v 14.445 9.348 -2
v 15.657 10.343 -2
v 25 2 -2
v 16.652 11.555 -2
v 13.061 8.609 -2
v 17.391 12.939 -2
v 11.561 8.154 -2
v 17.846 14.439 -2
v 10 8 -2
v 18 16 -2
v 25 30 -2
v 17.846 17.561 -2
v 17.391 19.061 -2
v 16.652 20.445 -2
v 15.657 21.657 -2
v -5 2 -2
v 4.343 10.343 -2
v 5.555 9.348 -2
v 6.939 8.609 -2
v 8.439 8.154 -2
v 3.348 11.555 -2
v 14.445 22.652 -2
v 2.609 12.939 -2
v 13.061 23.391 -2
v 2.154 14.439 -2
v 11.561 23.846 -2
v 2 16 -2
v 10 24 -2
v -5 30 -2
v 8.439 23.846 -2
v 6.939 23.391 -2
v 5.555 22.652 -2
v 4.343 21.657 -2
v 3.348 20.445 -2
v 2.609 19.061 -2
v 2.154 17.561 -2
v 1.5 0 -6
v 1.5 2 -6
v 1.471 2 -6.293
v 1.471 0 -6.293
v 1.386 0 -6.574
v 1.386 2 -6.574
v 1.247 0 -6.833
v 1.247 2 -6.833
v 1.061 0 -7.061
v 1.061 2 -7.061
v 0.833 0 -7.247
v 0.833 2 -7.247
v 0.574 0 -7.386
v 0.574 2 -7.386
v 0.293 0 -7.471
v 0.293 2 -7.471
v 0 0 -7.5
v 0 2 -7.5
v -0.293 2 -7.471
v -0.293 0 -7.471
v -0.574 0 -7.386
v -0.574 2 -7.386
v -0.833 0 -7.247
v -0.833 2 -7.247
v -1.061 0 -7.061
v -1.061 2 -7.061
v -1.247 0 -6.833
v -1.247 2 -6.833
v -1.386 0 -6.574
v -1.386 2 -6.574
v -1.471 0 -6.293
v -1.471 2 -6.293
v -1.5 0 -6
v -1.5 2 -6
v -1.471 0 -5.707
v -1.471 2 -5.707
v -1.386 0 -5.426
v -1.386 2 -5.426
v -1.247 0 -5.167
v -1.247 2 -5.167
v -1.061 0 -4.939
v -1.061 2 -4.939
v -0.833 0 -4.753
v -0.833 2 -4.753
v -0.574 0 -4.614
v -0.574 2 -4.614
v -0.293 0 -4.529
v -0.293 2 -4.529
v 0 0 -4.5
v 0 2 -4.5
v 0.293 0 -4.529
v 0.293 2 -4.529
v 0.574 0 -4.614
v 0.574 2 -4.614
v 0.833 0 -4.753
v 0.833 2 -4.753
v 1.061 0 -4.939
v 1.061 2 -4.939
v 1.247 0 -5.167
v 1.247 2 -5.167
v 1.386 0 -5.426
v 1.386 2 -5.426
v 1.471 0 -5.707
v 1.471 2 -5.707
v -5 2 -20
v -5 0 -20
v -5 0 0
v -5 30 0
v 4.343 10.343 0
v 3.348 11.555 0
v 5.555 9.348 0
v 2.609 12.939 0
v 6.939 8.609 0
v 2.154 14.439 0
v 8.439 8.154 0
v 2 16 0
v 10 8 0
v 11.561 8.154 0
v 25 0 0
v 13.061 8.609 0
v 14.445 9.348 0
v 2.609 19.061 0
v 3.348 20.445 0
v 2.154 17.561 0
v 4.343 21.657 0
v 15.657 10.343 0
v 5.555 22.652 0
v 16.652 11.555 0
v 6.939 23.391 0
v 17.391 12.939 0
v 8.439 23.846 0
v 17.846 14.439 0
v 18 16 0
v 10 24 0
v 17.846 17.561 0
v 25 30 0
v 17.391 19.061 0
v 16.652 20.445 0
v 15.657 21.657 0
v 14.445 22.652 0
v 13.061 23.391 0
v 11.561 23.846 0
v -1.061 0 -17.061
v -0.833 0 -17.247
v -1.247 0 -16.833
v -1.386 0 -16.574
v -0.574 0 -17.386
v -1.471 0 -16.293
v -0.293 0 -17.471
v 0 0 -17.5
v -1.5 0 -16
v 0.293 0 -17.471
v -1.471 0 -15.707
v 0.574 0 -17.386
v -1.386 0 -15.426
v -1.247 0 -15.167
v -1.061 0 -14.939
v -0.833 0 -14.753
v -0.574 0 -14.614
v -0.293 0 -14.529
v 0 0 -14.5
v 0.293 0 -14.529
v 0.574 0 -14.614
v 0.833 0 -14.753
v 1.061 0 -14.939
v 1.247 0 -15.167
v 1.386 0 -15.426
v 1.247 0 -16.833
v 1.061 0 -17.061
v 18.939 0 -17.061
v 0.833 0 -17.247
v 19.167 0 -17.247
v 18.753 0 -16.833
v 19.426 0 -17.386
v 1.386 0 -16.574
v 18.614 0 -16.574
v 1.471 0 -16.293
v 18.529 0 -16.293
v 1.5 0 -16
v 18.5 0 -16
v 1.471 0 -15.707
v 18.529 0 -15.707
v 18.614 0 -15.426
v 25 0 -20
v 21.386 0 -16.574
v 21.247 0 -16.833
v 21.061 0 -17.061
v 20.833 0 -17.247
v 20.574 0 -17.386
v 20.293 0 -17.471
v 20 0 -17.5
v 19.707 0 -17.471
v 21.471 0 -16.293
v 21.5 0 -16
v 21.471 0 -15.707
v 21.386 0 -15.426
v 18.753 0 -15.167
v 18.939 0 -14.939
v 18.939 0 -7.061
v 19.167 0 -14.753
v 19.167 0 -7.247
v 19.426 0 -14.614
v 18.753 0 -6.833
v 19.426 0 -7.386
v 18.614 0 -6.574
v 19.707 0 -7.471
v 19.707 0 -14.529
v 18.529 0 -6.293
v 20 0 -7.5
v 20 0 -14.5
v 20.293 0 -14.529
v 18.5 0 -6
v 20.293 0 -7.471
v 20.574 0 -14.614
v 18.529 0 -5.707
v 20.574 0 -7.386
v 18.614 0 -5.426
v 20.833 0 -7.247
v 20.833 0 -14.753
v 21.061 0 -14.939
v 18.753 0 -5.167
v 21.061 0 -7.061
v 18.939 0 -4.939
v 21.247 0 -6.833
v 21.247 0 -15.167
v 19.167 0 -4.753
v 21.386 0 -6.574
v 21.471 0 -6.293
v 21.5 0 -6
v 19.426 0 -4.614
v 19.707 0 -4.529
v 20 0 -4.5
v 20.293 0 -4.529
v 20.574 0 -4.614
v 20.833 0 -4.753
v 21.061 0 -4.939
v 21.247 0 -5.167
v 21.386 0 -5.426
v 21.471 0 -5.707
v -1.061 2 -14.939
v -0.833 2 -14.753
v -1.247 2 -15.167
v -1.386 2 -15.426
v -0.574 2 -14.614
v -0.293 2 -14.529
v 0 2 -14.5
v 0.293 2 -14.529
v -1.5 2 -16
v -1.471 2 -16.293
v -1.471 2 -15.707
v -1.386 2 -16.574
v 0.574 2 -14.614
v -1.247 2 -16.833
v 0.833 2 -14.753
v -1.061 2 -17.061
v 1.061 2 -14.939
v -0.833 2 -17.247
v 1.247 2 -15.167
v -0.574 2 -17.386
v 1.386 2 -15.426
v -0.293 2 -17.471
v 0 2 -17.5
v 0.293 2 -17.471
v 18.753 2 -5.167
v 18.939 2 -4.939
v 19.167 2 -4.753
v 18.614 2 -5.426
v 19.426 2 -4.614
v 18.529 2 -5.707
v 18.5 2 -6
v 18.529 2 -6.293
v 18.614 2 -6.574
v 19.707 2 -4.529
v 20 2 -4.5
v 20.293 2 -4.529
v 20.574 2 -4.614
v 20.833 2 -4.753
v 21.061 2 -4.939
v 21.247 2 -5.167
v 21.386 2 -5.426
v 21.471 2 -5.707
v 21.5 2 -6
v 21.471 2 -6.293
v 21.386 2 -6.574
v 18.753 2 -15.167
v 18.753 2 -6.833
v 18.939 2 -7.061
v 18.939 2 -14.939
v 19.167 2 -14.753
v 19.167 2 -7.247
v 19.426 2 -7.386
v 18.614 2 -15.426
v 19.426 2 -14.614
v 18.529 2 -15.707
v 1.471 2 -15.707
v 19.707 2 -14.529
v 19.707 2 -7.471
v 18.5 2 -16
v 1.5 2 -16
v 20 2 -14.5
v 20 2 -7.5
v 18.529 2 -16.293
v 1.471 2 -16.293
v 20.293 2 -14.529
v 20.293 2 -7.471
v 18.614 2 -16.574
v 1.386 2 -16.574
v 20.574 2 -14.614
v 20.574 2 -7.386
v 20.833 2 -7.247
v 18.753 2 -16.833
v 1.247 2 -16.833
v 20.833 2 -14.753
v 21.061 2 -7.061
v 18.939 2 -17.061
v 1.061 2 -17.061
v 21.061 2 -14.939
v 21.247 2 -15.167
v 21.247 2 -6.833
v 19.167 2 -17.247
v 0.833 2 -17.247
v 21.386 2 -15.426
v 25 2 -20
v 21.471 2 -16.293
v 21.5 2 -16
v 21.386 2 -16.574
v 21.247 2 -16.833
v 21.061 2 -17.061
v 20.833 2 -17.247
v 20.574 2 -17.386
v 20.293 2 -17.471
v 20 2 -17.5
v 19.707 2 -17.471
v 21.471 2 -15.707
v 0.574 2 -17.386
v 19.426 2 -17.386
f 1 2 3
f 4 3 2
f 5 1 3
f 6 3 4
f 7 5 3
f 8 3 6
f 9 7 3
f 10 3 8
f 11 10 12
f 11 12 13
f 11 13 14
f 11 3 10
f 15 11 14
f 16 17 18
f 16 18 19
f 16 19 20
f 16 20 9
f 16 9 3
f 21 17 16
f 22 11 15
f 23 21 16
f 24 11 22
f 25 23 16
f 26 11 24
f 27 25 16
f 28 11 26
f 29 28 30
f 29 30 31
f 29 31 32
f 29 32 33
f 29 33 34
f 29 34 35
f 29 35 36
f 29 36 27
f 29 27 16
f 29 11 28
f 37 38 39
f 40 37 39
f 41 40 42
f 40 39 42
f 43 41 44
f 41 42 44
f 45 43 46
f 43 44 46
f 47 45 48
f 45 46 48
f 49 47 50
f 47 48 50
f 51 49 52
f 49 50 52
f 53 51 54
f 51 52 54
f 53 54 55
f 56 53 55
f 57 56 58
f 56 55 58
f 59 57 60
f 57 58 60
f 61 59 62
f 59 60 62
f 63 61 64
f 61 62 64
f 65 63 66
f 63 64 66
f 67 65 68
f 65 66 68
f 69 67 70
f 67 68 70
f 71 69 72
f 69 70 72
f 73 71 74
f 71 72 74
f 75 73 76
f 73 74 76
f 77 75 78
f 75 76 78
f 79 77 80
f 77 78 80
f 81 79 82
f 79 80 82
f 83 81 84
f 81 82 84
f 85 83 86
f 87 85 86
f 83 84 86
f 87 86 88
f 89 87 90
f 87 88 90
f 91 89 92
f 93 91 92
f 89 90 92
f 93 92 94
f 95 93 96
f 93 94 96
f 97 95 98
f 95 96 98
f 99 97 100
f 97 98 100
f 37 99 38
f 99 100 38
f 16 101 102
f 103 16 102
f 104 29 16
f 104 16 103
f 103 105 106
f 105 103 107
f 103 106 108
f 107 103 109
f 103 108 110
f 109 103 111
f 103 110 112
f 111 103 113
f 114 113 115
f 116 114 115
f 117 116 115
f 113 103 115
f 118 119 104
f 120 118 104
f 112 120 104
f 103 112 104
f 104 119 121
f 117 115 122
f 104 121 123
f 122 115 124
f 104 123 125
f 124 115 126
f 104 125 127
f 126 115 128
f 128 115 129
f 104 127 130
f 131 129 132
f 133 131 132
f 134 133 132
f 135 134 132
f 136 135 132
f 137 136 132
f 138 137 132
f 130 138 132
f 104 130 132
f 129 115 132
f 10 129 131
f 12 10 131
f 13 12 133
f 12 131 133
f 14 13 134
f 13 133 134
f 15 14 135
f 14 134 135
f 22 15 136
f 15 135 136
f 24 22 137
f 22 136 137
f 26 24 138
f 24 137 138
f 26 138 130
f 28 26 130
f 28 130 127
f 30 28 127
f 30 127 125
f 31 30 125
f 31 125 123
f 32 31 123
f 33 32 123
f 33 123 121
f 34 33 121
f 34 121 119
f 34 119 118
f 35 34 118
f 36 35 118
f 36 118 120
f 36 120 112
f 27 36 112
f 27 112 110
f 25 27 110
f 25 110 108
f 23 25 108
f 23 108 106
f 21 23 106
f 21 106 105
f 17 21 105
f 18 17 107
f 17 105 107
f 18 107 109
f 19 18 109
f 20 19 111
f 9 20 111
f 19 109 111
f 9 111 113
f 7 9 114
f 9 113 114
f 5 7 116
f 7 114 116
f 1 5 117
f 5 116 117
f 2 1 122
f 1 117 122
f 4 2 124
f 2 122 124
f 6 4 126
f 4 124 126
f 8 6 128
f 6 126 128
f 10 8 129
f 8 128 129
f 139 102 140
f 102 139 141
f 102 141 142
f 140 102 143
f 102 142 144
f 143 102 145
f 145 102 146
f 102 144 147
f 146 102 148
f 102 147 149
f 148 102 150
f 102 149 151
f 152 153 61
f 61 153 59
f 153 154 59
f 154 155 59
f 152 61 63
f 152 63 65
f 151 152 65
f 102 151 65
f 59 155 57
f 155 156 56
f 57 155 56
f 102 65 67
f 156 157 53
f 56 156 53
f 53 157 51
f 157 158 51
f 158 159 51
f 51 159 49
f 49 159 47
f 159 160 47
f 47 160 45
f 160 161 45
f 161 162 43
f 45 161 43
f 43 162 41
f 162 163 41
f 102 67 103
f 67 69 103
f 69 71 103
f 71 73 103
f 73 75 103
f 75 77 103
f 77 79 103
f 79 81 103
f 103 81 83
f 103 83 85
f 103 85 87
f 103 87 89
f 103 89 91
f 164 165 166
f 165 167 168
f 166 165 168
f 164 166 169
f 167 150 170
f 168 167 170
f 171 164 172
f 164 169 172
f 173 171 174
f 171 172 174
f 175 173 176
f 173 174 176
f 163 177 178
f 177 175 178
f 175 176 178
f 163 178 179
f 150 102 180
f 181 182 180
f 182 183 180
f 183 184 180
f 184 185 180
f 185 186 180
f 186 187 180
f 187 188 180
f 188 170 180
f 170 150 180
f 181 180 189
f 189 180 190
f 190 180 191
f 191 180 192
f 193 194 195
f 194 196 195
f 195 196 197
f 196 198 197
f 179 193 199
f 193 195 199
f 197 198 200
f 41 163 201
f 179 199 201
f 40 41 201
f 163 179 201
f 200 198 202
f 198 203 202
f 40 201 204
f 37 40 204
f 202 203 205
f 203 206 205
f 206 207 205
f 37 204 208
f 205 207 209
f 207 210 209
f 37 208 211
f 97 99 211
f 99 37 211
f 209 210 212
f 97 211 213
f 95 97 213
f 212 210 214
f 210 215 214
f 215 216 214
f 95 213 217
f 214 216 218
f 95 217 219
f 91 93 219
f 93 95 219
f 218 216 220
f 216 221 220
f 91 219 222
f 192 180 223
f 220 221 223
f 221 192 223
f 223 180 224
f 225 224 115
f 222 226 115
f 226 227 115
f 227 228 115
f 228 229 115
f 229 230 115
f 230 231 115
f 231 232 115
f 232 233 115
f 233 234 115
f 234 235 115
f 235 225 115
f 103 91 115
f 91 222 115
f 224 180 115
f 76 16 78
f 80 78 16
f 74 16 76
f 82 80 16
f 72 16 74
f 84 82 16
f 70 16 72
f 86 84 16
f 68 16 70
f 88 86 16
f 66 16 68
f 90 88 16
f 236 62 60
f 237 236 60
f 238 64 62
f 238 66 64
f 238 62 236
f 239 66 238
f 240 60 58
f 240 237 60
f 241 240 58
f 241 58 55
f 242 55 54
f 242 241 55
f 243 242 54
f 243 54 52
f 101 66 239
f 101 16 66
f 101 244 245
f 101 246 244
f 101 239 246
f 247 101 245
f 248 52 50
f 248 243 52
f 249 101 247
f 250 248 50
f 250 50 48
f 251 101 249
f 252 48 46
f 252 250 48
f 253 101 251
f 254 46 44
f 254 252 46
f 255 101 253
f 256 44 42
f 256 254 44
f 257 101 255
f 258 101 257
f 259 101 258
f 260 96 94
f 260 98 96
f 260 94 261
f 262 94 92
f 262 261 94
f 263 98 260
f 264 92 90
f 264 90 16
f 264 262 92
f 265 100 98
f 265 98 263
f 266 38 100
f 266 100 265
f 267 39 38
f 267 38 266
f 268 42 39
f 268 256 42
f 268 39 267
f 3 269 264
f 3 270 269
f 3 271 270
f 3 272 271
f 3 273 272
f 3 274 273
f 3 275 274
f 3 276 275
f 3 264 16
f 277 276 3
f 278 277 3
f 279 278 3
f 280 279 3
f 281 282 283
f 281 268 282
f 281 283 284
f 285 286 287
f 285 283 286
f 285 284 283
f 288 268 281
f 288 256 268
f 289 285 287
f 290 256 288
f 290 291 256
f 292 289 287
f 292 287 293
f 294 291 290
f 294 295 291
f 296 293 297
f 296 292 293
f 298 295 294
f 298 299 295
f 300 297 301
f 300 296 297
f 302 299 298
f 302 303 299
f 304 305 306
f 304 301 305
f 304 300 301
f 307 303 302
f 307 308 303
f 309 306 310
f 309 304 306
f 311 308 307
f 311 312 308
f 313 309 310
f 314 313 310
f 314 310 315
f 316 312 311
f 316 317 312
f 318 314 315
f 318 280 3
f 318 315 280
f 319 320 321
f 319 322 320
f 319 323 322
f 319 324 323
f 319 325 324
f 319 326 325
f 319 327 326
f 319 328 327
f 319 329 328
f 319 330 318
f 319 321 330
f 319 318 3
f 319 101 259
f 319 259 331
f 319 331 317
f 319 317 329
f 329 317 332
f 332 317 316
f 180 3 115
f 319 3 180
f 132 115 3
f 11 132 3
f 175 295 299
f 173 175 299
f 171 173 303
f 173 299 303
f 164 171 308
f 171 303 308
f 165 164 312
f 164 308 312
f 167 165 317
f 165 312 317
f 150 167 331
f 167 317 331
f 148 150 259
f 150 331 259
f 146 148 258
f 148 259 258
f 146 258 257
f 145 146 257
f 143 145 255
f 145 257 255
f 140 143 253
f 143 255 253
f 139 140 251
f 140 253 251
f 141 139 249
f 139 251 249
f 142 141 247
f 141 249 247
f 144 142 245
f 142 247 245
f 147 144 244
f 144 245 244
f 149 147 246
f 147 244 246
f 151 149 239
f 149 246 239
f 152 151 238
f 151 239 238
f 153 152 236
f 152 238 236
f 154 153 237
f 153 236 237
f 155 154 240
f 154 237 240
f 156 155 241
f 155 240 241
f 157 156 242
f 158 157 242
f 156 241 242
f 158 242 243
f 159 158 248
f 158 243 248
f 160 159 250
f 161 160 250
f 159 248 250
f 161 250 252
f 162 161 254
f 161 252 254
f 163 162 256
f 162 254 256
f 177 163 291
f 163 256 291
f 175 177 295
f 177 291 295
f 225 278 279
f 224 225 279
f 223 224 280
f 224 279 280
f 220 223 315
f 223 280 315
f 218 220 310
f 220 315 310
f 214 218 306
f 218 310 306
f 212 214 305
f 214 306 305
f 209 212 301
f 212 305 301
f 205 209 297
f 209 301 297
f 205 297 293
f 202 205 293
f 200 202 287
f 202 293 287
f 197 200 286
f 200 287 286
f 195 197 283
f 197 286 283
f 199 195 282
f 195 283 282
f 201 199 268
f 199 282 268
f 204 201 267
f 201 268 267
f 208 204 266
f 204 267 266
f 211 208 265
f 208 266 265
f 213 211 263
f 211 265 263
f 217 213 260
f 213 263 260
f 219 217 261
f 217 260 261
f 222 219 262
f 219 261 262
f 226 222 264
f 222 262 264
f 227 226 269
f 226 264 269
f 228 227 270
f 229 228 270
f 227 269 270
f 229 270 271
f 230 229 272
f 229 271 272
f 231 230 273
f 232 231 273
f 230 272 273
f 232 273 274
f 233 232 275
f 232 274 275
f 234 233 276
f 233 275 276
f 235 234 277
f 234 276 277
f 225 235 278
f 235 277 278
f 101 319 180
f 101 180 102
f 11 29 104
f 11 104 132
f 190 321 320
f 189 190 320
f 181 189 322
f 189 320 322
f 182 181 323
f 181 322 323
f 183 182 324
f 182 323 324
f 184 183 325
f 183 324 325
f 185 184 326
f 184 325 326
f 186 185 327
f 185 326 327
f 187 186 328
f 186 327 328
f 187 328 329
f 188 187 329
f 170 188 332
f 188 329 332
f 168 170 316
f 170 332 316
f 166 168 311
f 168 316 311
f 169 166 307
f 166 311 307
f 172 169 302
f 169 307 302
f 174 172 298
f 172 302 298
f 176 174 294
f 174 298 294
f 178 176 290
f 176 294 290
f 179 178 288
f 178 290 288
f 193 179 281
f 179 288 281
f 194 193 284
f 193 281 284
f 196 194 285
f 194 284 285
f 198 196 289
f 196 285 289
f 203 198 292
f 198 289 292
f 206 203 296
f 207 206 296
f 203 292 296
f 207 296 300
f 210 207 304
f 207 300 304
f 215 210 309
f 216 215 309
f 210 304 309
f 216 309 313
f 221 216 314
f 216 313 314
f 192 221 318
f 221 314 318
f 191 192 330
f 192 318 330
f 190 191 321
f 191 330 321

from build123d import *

# Parameters (mm, degrees)
EXTRUDE_1_DEPTH     = 20
SKETCH_9_W          = 35
SKETCH_9_H          = 3
EXTRUDE_2_DEPTH     = 5
SKETCH_10_W         = 3
SKETCH_10_H         = 35
EXTRUDE_3_DEPTH     = 5
SKETCH_11_R         = 8
CUT_EXTRUDE_4_DEPTH = 8
SKETCH_12_W         = 30
SKETCH_12_H         = 3
CUT_EXTRUDE_5_DEPTH = 18
SKETCH_13_W         = 30
SKETCH_13_H         = 17
CUT_EXTRUDE_6_DEPTH = 1
SKETCH_14_W         = 30
SKETCH_14_H         = 36
CUT_EXTRUDE_7_DEPTH = 1
SKETCH_15_R         = 1.5
CUT_EXTRUDE_8_DEPTH = 2
SKETCH_17_W         = 39.353314789
SKETCH_17_H         = 5.702998022
CUT_EXTRUDE_9_DEPTH = 8


with BuildPart() as part:
    # 草图1 → 凸台-拉伸1 (new body)
    with BuildSketch(Plane(origin=(0, 0, 0), x_dir=(0, 0, -1), z_dir=(1, 0, 0))):
        Polygon((0, 0), (0, 38), (3, 38), (3, 3), (38, 3), (38, 0), align=None)
    extrude(amount=EXTRUDE_1_DEPTH)

    # 草图9 → 凸台-拉伸2 (add)
    with BuildSketch(Plane(origin=(20, 0, 0), x_dir=(0, 0, -1), z_dir=(1, 0, 0))):
        Polygon((3, 38), (0, 38), (0, 0), (3, 0), (3, 3), align=None)
        with Locations((20.5, 1.5)):
            Rectangle(SKETCH_9_W, SKETCH_9_H)
    extrude(amount=EXTRUDE_2_DEPTH)

    # 草图10 → 凸台-拉伸3 (add)
    with BuildSketch(Plane.ZY):
        with Locations((-1.5, 20.5)):
            Rectangle(SKETCH_10_W, SKETCH_10_H)
        Polygon((0, 0), (0, 3), (-3, 3), (-38, 3), (-38, 0), align=None)
    extrude(amount=EXTRUDE_3_DEPTH)

    # 草图11 → 切除-拉伸4 (cut)
    with BuildSketch(Plane.XY):
        with Locations((10, 16)):
            Circle(SKETCH_11_R)
    extrude(amount=-CUT_EXTRUDE_4_DEPTH, mode=Mode.SUBTRACT)

    # 草图12 → 切除-拉伸5 (cut)
    with BuildSketch(Plane(origin=(0, 0, -38), x_dir=(-1, 0, 0), z_dir=(0, 0, -1))):
        with Locations((-10, 1.5)):
            Rectangle(SKETCH_12_W, SKETCH_12_H)
    extrude(amount=-CUT_EXTRUDE_5_DEPTH, mode=Mode.SUBTRACT)

    # 草图13 → 切除-拉伸6 (cut)
    with BuildSketch(Plane(origin=(0, 3, 0), x_dir=(1, 0, 0), z_dir=(0, 1, 0))):
        with Locations((10, 11.5)):
            Rectangle(SKETCH_13_W, SKETCH_13_H)
    extrude(amount=-CUT_EXTRUDE_6_DEPTH, mode=Mode.SUBTRACT)

    # 草图14 → 切除-拉伸7 (cut)
    with BuildSketch(Plane(origin=(0, 0, -3), x_dir=(-1, 0, 0), z_dir=(0, 0, -1))):
        with Locations((-10, 20)):
            Rectangle(SKETCH_14_W, SKETCH_14_H)
    extrude(amount=-CUT_EXTRUDE_7_DEPTH, mode=Mode.SUBTRACT)

    # 草图15 → 切除-拉伸8 (cut)
    with BuildSketch(Plane(origin=(0, 2, 0), x_dir=(1, 0, 0), z_dir=(0, 1, 0))):
        with Locations((20, 6)):
            Circle(SKETCH_15_R)
        with Locations((0, 6)):
            Circle(SKETCH_15_R)
        with Locations((0, 16)):
            Circle(SKETCH_15_R)
        with Locations((20, 16)):
            Circle(SKETCH_15_R)
    extrude(amount=-CUT_EXTRUDE_8_DEPTH, mode=Mode.SUBTRACT)

    # 草图17 → 切除-拉伸9 (cut)
    with BuildSketch(Plane(origin=(0, 38, 0), x_dir=(1, 0, 0), z_dir=(0, 1, 0))):
        with Locations((8.215909563, 1.4252762)):
            Rectangle(SKETCH_17_W, SKETCH_17_H)
    extrude(amount=-CUT_EXTRUDE_9_DEPTH, mode=Mode.SUBTRACT)


solid = part.part
